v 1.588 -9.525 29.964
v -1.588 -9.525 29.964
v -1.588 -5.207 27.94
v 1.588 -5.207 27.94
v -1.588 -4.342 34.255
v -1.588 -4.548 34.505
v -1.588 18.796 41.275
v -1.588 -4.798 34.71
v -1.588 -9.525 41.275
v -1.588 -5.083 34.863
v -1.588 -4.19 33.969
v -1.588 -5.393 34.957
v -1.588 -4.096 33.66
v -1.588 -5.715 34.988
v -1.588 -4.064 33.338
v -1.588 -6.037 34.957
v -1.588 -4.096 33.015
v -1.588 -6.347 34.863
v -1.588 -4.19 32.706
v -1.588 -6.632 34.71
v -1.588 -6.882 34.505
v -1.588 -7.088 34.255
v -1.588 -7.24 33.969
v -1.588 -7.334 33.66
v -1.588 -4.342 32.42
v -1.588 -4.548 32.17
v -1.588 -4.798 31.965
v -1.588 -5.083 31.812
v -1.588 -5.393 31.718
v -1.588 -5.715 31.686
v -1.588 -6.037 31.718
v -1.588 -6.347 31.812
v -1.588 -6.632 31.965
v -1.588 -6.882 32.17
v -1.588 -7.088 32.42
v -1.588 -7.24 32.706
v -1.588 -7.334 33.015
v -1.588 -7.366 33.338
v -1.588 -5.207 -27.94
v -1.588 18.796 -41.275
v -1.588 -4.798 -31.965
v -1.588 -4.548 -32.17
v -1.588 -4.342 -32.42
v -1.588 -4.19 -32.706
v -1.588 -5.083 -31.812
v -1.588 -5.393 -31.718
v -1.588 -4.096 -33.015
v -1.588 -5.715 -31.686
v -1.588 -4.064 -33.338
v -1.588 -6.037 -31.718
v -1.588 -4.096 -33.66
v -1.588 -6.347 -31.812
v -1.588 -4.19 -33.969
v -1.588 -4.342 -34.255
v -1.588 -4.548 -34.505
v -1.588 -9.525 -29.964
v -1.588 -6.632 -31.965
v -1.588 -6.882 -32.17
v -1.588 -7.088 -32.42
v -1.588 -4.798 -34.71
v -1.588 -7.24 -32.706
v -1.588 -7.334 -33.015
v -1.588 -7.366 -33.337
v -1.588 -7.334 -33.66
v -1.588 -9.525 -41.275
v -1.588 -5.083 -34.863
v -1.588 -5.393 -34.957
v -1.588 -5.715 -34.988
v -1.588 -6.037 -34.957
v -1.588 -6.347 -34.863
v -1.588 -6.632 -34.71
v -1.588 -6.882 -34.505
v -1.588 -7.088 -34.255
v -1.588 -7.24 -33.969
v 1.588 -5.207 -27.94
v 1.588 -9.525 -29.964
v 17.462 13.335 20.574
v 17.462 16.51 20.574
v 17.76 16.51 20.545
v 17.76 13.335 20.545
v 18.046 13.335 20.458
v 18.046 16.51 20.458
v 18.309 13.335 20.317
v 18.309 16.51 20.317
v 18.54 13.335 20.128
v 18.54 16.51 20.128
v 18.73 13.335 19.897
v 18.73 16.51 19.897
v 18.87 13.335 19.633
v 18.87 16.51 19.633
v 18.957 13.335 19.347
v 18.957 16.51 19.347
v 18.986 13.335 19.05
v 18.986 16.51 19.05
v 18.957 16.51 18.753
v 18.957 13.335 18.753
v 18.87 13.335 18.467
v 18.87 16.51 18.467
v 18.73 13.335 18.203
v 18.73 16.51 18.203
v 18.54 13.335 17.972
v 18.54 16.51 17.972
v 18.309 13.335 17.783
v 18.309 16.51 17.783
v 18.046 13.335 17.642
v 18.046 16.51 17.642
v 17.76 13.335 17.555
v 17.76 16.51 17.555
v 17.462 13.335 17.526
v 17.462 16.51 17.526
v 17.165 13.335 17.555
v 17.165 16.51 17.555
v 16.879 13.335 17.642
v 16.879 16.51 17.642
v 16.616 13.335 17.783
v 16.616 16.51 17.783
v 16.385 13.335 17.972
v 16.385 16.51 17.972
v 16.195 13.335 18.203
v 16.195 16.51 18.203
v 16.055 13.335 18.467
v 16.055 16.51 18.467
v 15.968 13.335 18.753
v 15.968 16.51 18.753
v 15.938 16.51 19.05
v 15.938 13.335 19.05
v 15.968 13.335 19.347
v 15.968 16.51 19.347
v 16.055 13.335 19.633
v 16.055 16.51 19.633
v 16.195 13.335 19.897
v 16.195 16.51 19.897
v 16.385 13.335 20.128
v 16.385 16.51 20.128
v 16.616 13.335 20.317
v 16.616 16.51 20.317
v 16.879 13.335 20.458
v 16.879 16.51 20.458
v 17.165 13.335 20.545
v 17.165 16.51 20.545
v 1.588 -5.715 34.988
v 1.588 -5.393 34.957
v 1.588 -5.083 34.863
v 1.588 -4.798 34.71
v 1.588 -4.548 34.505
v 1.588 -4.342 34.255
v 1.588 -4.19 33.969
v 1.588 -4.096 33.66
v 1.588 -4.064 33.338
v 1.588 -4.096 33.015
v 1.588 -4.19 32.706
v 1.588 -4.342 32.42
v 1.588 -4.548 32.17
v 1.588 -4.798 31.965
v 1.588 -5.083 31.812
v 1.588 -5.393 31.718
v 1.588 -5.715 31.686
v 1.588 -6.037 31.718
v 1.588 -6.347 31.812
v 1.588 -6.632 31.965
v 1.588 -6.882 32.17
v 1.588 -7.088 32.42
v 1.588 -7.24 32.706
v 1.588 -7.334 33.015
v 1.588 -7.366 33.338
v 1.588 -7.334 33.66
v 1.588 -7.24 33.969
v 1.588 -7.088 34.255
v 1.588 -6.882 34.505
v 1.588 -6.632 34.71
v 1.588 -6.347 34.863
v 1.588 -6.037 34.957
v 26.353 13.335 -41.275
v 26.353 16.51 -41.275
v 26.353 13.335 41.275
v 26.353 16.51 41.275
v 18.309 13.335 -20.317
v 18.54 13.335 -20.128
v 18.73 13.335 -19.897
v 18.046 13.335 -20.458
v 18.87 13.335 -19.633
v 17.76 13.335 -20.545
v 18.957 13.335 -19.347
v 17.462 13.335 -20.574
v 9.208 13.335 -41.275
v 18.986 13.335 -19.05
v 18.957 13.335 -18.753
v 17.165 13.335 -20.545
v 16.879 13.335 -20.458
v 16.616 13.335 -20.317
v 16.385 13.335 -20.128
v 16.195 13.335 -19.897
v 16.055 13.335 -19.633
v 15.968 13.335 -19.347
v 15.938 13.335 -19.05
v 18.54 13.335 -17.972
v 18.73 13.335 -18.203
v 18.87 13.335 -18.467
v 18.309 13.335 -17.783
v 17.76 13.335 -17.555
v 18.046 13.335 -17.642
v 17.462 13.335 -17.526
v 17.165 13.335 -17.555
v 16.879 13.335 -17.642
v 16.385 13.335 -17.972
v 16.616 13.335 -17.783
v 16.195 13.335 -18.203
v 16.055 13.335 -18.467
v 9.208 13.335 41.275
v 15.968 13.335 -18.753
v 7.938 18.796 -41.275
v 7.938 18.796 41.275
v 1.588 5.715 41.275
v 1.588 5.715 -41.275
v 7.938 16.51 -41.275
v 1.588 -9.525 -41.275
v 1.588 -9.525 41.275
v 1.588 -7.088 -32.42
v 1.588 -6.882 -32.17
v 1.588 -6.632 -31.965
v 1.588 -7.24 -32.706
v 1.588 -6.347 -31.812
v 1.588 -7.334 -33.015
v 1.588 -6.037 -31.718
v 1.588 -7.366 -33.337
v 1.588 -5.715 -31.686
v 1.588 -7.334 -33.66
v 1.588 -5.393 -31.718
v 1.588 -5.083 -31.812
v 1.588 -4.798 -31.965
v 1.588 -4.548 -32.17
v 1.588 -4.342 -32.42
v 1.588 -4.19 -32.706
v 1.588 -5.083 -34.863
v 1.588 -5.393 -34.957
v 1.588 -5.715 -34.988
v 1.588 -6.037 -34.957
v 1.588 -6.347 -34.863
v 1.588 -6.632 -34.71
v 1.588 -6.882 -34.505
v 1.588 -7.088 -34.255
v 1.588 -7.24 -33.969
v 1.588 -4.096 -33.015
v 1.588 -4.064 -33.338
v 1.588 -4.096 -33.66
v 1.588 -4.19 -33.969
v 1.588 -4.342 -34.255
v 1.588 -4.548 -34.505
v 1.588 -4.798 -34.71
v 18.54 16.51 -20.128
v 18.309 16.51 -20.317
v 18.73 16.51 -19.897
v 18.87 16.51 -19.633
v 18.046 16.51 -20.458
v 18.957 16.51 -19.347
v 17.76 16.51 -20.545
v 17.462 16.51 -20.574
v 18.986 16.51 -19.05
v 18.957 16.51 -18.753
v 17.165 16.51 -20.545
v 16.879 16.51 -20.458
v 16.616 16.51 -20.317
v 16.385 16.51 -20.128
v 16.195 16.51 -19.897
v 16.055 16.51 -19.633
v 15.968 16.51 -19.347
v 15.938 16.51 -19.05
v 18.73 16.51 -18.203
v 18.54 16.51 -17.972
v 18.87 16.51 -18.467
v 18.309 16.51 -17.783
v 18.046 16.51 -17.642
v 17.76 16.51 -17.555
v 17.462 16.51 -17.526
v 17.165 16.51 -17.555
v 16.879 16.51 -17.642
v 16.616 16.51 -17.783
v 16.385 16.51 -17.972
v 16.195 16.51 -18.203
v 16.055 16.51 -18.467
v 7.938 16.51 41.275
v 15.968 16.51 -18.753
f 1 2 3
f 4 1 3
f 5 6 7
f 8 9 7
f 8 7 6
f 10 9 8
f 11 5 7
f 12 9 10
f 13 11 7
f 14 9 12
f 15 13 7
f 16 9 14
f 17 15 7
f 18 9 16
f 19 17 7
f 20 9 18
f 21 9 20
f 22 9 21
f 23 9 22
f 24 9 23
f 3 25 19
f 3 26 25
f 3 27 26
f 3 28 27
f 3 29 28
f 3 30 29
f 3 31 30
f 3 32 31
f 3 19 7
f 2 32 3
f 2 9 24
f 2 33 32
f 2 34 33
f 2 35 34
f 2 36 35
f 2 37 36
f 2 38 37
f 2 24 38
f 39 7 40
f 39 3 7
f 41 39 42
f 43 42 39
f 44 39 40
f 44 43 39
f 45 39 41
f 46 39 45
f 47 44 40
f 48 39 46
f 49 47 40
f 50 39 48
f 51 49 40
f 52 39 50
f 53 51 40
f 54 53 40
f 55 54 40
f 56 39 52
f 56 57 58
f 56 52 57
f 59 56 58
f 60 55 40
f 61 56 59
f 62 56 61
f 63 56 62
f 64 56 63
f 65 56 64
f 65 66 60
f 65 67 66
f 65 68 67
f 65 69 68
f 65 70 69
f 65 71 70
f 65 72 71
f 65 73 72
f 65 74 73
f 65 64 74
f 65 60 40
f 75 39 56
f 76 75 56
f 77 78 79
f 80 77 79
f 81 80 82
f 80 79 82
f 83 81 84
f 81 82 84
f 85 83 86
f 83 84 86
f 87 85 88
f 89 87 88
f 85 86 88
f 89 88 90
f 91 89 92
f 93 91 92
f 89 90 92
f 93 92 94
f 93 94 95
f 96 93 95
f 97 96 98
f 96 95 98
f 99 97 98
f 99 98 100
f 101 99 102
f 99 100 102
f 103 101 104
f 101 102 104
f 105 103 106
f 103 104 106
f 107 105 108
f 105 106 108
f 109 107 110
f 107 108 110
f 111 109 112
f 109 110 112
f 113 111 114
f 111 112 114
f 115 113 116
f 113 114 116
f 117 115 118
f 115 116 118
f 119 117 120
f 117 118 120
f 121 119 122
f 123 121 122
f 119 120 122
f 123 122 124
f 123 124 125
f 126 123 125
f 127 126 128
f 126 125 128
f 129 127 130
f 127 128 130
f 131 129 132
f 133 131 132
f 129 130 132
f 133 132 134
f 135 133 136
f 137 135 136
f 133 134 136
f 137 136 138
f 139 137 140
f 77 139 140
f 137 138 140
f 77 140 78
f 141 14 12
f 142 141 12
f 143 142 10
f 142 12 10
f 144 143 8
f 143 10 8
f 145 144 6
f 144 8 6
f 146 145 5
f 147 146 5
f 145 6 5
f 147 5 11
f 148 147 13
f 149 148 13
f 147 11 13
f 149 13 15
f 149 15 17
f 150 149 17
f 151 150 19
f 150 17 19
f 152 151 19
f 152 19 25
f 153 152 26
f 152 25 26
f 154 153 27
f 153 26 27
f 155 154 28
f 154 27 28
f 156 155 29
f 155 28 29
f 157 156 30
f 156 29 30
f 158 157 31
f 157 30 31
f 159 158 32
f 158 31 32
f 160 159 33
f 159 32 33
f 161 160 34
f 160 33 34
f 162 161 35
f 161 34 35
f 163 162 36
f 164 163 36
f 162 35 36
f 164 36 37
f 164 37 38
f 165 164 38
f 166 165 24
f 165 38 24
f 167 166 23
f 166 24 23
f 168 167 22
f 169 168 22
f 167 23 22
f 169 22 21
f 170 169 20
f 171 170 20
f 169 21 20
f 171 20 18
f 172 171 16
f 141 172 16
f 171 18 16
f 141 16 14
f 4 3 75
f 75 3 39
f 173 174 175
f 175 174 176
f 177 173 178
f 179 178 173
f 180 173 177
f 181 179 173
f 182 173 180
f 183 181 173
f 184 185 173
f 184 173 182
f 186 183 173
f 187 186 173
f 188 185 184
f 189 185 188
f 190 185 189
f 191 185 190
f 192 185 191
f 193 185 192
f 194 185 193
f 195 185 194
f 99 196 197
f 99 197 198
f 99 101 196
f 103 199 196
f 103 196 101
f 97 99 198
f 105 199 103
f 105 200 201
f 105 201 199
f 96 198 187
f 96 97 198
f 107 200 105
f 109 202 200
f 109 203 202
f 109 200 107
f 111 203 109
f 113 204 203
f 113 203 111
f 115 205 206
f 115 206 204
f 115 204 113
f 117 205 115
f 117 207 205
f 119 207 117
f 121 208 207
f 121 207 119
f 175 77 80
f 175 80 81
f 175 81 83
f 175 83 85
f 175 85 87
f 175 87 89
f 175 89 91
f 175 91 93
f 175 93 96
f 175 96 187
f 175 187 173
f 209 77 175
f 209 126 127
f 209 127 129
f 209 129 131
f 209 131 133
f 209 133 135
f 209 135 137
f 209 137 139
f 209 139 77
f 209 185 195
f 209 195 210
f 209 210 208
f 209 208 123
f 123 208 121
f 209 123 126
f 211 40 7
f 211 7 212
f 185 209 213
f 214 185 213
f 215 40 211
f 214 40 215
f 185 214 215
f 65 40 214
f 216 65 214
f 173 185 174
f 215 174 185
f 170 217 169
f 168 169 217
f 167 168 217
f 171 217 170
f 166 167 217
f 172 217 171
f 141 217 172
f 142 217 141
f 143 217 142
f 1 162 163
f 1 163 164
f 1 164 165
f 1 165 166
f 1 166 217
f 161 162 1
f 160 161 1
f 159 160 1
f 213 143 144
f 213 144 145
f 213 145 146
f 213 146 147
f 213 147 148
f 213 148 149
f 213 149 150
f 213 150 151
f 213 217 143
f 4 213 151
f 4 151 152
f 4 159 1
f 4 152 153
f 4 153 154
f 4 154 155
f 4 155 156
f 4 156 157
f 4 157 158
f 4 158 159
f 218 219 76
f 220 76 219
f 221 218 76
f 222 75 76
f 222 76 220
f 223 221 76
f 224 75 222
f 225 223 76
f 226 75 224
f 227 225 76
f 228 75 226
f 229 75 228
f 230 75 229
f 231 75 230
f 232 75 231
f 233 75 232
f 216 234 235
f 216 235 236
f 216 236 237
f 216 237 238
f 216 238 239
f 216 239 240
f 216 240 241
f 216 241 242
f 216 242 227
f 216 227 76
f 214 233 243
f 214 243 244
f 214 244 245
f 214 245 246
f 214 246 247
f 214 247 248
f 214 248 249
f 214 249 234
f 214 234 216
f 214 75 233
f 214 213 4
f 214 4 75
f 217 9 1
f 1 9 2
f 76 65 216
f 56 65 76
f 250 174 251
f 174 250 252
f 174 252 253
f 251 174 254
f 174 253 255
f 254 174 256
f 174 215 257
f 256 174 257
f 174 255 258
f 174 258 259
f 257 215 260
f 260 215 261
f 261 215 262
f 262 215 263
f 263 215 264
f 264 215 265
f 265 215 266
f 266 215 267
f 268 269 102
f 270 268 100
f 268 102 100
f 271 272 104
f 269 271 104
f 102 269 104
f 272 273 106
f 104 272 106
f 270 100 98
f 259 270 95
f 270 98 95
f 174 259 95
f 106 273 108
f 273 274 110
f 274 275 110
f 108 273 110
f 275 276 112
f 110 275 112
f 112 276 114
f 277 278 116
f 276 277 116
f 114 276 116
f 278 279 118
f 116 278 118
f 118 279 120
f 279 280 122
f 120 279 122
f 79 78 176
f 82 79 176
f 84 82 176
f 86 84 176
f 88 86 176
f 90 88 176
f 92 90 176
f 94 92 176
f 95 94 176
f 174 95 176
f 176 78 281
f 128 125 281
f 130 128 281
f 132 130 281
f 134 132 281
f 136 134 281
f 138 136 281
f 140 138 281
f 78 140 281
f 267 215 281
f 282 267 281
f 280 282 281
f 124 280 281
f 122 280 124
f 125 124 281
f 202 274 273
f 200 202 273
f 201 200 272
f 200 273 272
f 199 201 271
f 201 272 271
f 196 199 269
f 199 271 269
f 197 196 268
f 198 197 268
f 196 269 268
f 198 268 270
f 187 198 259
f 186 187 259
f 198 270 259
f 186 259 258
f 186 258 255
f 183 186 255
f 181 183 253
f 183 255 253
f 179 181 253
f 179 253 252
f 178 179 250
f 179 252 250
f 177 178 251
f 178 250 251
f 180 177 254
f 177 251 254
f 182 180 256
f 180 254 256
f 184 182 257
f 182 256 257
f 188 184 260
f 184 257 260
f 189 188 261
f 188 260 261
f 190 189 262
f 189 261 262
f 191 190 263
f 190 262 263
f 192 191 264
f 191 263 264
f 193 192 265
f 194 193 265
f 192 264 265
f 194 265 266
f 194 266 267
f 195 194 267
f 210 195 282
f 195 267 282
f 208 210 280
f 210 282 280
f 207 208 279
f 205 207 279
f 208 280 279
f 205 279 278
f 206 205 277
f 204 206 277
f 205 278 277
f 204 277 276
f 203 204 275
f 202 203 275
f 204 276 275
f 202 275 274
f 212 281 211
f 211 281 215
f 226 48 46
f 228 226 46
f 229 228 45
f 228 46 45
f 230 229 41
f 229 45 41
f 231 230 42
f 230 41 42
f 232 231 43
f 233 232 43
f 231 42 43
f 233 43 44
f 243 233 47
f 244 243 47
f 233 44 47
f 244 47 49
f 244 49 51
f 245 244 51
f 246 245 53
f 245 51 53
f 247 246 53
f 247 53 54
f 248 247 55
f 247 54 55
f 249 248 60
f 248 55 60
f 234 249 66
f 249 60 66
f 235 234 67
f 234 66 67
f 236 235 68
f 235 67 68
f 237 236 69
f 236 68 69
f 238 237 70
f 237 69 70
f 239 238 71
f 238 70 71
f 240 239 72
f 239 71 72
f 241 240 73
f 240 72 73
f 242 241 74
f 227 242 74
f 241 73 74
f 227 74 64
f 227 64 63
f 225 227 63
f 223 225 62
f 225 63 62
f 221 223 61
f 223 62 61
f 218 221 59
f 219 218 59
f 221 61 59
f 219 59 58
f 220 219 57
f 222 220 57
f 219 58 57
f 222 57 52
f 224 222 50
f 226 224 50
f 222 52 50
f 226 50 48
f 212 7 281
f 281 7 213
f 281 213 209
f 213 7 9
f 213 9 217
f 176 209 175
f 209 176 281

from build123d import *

# Parameters (mm, degrees)
SKETCH1_W           = 82.55
SKETCH1_H           = 26.67
BOSS_EXTRUDE1_DEPTH = 1.5875
SKETCH2_R           = 1.651
SKETCH2_R_2         = 1.5875
CUT_EXTRUDE1_DEPTH  = 3.175
SKETCH5_W           = 82.55
SKETCH5_H           = 3.175
BOSS_EXTRUDE3_DEPTH = 27.94
SKETCH6_R           = 1.524
CUT_EXTRUDE3_DEPTH  = 3.175
CUT_EXTRUDE4_DEPTH  = 3.175
BOSS_EXTRUDE4_DEPTH = 82.55
CUT_EXTRUDE5_DEPTH  = 3.175
SKETCH10_W          = 9.525
SKETCH10_H          = 82.55
BOSS_EXTRUDE5_DEPTH = 2.286


with BuildPart() as part:
    # Sketch1 → Boss-Extrude1 (new, symmetric)
    with BuildSketch(Plane(origin=(0, 0, 0), x_dir=(0, 0, -1), z_dir=(1, 0, 0))):
        Rectangle(SKETCH1_W, SKETCH1_H)
    extrude(amount=BOSS_EXTRUDE1_DEPTH, both=True)

    # Sketch2 → Cut-Extrude1 (cut)
    with BuildSketch(Plane.ZY.offset(1.5875)):
        with Locations((33.3375, -5.715)):
            Circle(SKETCH2_R)
        with Locations((-33.3375, -5.715)):
            Circle(SKETCH2_R)
        with Locations((-26.4795, -10.16)):
            Circle(SKETCH2_R_2)
        with Locations((26.4795, -10.16)):
            Circle(SKETCH2_R_2)
    extrude(amount=-CUT_EXTRUDE1_DEPTH, mode=Mode.SUBTRACT)

    # Sketch5 → Boss-Extrude3 (add)
    with BuildSketch(Plane.ZY.offset(1.5875)):
        with Locations((0, 14.9225)):
            Rectangle(SKETCH5_W, SKETCH5_H)
    extrude(amount=-BOSS_EXTRUDE3_DEPTH)

    # Sketch6 → Cut-Extrude3 (cut)
    with BuildSketch(Plane(origin=(0, 16.51, 0), x_dir=(1, 0, 0), z_dir=(0, 1, 0))):
        with Locations(Location((17.4625, 19.05, 0), (0, 0, 270))):
            Circle(SKETCH6_R)
        with Locations(Location((17.4625, -19.05, 0), (0, 0, 270))):
            Circle(SKETCH6_R)
    extrude(amount=-CUT_EXTRUDE3_DEPTH, mode=Mode.SUBTRACT)

    # Sketch7 → Cut-Extrude4 (cut)
    with BuildSketch(Plane.ZY.offset(1.5875)):
        Polygon((-31.75, -13.335), (31.75, -13.335), (27.94, -5.207), (-27.94, -5.207), align=None)
    extrude(amount=-CUT_EXTRUDE4_DEPTH, mode=Mode.SUBTRACT)

    # Sketch8 → Boss-Extrude4 (add)
    with BuildSketch(Plane.XY.offset(41.275)):
        Polygon((1.5875, 13.335), (9.2075, 13.335), (1.5875, 5.715), align=None)
    extrude(amount=-BOSS_EXTRUDE4_DEPTH)

    # Sketch9 → Cut-Extrude5 (cut)
    with BuildSketch(Plane.ZY.offset(1.5875)):
        Polygon((-41.275, -13.335), (-41.275, -9.525), (-29.9640625, -9.525), (-31.75, -13.335), align=None)
        Polygon((41.275, -13.335), (41.275, -9.525), (29.9640625, -9.525), (31.75, -13.335), align=None)
    extrude(amount=-CUT_EXTRUDE5_DEPTH, mode=Mode.SUBTRACT)

    # Sketch10 → Boss-Extrude5 (add)
    with BuildSketch(Plane(origin=(0, 16.51, 0), x_dir=(1, 0, 0), z_dir=(0, 1, 0))):
        with Locations((3.175, 0)):
            Rectangle(SKETCH10_W, SKETCH10_H)
    extrude(amount=BOSS_EXTRUDE5_DEPTH)


solid = part.part
